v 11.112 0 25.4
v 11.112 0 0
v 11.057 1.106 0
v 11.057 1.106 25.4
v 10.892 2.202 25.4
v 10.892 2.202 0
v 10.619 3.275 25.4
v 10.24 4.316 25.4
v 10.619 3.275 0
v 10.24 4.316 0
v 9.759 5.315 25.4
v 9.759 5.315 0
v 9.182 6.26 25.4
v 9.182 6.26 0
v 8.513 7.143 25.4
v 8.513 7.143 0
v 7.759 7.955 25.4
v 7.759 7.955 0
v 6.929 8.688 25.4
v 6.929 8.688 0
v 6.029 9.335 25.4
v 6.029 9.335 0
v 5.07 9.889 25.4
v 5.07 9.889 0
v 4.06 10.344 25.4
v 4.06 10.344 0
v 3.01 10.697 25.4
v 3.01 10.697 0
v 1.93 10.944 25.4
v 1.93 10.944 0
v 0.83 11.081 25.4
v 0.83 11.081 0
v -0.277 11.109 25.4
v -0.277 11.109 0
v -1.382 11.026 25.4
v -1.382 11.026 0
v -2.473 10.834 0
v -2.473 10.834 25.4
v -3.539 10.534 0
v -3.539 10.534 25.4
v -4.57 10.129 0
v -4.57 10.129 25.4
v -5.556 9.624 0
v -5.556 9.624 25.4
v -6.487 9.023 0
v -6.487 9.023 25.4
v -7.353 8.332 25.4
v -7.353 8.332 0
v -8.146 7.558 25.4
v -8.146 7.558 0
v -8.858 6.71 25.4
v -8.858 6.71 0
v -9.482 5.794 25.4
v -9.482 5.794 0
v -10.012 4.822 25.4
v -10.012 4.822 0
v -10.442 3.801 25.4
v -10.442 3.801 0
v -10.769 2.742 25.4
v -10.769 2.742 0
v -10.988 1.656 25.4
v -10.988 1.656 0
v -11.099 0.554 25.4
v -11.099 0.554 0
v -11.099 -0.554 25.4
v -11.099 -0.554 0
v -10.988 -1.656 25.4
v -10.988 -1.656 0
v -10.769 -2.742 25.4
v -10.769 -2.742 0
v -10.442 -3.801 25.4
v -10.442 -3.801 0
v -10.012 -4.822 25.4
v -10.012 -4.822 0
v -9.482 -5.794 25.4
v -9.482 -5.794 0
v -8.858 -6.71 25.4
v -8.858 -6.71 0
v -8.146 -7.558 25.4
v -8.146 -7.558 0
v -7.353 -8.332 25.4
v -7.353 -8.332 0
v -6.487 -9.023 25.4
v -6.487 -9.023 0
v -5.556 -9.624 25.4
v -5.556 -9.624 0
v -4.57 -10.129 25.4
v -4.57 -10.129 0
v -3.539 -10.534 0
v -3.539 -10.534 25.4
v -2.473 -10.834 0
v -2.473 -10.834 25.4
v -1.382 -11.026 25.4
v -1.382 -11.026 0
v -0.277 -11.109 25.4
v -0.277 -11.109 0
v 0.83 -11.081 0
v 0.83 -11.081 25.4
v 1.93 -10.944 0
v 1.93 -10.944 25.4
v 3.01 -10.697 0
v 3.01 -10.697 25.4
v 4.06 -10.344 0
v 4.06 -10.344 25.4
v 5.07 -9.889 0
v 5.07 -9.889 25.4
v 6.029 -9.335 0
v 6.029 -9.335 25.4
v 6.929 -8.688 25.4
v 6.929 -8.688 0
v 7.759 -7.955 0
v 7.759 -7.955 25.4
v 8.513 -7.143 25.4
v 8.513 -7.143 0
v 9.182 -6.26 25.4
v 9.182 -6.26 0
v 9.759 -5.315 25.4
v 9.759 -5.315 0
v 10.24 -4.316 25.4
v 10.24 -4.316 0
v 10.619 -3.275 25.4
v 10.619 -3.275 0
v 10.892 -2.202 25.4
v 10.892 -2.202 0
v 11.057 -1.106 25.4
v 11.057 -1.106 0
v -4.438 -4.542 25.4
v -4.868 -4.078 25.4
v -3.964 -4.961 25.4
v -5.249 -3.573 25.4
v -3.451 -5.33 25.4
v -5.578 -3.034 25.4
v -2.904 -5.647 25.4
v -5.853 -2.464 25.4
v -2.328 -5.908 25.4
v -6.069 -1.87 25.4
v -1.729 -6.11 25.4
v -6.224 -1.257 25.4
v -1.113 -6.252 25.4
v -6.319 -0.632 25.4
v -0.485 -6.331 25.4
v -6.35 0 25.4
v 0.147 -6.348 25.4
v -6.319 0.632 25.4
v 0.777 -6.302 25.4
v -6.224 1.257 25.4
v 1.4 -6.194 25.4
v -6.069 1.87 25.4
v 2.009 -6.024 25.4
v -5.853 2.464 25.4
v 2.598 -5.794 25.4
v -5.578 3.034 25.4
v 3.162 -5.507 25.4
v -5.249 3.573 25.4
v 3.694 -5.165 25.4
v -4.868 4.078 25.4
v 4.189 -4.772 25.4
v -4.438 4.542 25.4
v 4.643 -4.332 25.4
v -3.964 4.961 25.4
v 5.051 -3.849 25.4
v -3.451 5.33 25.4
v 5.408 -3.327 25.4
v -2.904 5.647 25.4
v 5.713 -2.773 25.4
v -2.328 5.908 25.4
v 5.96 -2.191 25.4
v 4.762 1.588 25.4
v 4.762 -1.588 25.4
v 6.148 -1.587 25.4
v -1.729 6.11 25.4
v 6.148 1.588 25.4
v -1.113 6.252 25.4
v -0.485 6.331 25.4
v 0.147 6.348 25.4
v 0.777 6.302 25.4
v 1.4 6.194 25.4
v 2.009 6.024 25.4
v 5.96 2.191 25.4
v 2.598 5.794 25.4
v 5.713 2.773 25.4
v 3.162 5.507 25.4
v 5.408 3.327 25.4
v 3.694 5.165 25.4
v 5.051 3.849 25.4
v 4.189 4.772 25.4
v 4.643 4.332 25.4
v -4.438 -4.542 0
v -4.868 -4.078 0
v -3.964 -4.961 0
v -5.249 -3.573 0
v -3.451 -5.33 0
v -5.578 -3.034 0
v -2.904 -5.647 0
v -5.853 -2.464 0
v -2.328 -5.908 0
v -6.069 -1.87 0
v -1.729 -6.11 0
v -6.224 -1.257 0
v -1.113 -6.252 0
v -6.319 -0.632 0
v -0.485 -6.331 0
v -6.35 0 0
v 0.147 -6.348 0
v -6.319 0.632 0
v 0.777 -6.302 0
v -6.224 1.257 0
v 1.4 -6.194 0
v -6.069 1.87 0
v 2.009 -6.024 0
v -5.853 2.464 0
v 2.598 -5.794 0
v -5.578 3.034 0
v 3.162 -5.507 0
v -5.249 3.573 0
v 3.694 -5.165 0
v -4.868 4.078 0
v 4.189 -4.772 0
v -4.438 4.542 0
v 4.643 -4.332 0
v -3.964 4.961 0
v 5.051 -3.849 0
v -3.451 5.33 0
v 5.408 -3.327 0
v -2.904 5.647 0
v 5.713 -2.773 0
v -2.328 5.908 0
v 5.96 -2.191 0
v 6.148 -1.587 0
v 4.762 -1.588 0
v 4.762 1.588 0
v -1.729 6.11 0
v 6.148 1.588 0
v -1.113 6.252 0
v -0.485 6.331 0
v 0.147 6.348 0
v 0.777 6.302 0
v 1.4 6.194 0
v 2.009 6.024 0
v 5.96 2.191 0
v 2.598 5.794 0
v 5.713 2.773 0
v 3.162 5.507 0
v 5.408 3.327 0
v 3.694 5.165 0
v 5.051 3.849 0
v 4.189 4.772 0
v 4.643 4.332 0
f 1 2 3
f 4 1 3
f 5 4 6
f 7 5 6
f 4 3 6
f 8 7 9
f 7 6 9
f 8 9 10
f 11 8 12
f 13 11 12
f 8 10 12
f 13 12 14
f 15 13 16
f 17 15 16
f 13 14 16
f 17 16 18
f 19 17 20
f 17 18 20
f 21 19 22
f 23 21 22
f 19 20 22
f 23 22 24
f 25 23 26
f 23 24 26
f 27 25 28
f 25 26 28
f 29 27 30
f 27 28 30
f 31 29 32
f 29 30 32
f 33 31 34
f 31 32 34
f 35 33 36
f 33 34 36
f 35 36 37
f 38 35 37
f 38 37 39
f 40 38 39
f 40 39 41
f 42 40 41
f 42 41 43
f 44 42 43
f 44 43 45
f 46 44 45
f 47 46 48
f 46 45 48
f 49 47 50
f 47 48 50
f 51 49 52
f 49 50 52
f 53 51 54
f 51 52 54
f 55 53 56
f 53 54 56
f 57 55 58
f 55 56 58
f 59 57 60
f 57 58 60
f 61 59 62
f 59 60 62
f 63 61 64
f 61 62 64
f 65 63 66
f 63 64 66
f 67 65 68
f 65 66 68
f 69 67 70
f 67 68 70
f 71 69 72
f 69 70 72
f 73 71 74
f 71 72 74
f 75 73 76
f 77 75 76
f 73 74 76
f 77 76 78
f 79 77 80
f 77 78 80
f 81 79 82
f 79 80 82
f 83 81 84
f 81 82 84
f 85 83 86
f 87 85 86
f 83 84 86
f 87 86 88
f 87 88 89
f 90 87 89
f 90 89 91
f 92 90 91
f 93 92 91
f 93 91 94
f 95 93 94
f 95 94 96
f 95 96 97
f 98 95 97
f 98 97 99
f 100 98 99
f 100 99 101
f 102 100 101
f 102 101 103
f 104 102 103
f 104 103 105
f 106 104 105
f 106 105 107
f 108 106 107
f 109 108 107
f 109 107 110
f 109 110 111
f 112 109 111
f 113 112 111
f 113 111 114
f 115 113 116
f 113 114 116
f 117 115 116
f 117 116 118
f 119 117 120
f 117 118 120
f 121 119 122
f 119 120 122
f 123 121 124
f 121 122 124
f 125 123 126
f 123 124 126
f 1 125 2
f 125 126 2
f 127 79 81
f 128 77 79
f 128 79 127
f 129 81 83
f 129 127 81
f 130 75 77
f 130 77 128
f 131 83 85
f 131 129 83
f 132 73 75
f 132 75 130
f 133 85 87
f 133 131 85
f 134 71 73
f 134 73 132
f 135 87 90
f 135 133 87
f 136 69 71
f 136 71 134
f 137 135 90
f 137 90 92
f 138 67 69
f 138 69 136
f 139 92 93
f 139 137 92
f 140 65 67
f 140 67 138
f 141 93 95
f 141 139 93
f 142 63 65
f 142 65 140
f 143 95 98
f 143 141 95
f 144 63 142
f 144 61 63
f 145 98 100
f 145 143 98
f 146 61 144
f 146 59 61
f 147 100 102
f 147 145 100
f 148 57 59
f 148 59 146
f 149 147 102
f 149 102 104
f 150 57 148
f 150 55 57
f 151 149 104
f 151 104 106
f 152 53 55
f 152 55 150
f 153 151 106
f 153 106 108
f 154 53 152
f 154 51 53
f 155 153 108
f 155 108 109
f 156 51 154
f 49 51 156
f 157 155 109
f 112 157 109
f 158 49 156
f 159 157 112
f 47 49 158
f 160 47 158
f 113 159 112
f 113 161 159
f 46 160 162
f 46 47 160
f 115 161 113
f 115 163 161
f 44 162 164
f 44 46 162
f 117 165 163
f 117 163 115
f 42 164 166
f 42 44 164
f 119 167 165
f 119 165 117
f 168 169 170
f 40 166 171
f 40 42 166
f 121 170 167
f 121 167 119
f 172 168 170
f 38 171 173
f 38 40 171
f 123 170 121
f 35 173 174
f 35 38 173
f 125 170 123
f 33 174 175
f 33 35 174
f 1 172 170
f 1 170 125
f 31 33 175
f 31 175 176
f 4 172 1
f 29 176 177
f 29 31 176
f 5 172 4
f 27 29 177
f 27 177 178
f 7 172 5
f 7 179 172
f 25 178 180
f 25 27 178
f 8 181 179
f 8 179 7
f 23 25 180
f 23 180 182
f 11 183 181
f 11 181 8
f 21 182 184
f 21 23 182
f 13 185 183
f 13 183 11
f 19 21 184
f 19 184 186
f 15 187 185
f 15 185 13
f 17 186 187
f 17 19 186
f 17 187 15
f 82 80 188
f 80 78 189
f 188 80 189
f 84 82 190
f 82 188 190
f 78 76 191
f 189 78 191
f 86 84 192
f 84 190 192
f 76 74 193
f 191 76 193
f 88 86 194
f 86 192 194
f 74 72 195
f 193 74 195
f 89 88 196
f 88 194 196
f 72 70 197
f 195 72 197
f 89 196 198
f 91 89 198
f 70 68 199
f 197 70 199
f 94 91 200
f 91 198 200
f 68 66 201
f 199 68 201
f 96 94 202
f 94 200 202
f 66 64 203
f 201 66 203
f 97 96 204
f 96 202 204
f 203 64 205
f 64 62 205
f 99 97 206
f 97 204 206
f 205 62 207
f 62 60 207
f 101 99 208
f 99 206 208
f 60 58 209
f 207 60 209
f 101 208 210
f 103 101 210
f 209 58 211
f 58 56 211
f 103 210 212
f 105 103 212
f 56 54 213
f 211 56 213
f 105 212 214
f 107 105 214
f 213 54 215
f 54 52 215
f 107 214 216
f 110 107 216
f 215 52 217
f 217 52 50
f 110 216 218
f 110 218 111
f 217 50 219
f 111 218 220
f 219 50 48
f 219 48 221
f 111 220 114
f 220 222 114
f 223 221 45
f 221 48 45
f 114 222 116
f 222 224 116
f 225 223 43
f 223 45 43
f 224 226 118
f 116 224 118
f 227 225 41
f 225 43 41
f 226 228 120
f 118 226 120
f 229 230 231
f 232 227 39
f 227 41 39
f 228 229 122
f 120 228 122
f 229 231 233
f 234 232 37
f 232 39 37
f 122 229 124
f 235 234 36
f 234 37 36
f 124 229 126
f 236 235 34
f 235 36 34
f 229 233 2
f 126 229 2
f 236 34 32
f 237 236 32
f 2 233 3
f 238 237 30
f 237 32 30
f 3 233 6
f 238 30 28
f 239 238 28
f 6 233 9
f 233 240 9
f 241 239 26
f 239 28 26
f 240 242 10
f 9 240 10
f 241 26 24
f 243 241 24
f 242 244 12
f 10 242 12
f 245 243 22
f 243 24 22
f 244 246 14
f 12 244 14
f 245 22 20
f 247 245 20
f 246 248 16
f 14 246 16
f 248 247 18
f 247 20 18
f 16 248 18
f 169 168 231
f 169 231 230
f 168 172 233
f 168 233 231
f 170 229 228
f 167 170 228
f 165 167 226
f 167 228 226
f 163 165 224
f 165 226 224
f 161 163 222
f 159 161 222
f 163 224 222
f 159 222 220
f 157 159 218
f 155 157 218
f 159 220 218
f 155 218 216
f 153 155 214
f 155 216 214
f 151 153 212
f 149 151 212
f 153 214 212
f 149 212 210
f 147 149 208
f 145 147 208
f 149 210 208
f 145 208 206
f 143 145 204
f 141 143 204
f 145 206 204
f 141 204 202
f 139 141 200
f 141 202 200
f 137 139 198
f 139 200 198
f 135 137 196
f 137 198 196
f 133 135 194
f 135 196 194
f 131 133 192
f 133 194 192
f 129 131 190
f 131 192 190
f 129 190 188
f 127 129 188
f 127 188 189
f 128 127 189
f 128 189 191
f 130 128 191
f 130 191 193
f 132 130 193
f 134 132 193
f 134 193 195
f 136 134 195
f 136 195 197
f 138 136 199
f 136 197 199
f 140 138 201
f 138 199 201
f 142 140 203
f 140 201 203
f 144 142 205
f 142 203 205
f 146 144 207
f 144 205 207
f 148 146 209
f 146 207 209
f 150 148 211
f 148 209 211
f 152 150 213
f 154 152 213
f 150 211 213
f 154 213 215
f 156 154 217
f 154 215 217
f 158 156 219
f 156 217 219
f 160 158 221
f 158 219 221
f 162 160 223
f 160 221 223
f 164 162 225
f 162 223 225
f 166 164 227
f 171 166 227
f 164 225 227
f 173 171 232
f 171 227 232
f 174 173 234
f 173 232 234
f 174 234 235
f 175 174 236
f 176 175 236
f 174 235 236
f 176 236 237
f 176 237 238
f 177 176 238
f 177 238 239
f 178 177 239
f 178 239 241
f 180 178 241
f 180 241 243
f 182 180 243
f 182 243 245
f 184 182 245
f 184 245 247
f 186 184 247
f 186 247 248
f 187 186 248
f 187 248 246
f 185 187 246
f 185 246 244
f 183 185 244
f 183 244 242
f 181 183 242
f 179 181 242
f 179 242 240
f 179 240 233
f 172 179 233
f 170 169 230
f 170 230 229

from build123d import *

# Parameters (mm, degrees)
F0_R     = 11.1125
F1_DEPTH = 25.4


with BuildPart() as f1:
    # F0 (on Top) → F1 (new body)
    with BuildSketch(Plane.XY):
        Circle(F0_R)
        with BuildLine():
            ThreePointArc((6.1483610621, -1.5875), (-6.35, 0), (6.1483610621, 1.5875))
            Line((6.1483610621, 1.5875), (7.9375, 1.5875))
            Line((7.9375, 1.5875), (7.9375, -1.5875))
            Line((7.9375, -1.5875), (6.1483610621, -1.5875))
        make_face(mode=Mode.SUBTRACT)
        with BuildLine():
            ThreePointArc((6.1483610621, 1.5875), (6.2993885713, 0.8001272573), (6.35, 0))
            ThreePointArc((6.35, 0), (6.2993885713, -0.8001272573), (6.1483610621, -1.5875))
            Line((6.1483610621, -1.5875), (7.9375, -1.5875))
            Line((7.9375, -1.5875), (7.9375, 1.5875))
            Line((7.9375, 1.5875), (6.1483610621, 1.5875))
        make_face()
        with BuildLine():
            ThreePointArc((6.1483610621, -1.5875), (6.2993885713, -0.8001272573), (6.35, 0))
            ThreePointArc((6.35, 0), (6.2993885713, 0.8001272573), (6.1483610621, 1.5875))
            Line((6.1483610621, 1.5875), (4.7625, 1.5875))
            Line((4.7625, 1.5875), (4.7625, -1.5875))
            Line((4.7625, -1.5875), (6.1483610621, -1.5875))
        make_face()
    extrude(amount=F1_DEPTH)


solid = f1.part
